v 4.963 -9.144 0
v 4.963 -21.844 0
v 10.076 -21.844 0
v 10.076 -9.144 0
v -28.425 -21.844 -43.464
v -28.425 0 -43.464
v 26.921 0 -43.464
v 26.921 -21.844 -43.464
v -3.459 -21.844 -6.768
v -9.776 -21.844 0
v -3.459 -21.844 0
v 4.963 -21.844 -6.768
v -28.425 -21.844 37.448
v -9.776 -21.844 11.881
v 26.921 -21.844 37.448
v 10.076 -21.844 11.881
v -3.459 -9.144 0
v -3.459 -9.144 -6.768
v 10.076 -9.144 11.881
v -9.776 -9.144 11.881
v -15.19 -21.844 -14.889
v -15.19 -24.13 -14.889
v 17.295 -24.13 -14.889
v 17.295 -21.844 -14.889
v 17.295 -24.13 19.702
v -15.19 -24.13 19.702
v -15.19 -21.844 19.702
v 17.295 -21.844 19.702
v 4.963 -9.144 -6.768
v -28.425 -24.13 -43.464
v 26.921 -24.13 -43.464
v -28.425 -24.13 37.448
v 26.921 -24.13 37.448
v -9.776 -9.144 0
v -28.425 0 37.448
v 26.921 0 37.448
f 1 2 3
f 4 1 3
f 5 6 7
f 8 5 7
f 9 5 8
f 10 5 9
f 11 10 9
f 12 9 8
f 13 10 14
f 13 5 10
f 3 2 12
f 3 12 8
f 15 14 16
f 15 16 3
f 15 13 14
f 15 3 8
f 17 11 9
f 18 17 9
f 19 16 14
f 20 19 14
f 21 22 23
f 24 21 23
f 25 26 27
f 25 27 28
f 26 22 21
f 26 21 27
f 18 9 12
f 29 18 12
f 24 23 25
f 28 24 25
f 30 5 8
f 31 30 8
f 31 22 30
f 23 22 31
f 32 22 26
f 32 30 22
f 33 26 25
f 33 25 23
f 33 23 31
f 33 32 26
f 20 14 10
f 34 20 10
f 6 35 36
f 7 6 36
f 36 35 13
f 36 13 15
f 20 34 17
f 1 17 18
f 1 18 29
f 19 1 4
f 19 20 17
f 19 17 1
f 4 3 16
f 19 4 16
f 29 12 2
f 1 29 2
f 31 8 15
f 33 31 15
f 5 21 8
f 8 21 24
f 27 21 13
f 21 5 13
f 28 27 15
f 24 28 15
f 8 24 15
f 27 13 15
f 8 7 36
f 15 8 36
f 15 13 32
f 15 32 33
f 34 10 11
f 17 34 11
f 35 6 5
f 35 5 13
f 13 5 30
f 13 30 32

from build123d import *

# Parameters (mm, degrees)
F0_W     = 55.3452633321
F0_H     = 80.9123702347
F1_DEPTH = 21.844
F3_DEPTH = 12.7
F4_W     = 55.3452633321
F4_H     = 80.9123702347
F5_DEPTH = 2.286
F6_W     = 32.4852615595
F6_H     = 34.5907891169
F7_DEPTH = 25.4


with BuildPart() as f1:
    # F0 (on Front) → F1 (new body)
    with BuildSketch(Plane.XZ):
        with Locations((-0.7519740611, -3.0078943819)):
            Rectangle(F0_W, F0_H)
    extrude(amount=F1_DEPTH)

    # F2 (on face) → F3 (cut)
    with BuildSketch(Plane.XZ.offset(21.844)):
        Polygon((10.07644739, 11.8811847642), (-9.7756581381, 11.8811847642), (-9.7756581381, 0), (-3.4590791911, 0), (-3.4590791911, -6.7677632906), (4.9630273134, -6.7677632906), (4.9630273134, 0), (10.07644739, 0), align=None)
    extrude(amount=-F3_DEPTH, mode=Mode.SUBTRACT)


with BuildPart() as f5:
    # F4 (on face) → F5 (new body)
    with BuildSketch(Plane.XZ.offset(21.844)):
        with Locations((-0.7519740611, -3.0078943819)):
            Rectangle(F4_W, F4_H)
    extrude(amount=F5_DEPTH)

    # F6 (on face) → F7 (cut)
    with BuildSketch(Plane.XZ.offset(24.13)):
        with Locations((1.0527633131, 2.4063154124)):
            Rectangle(F6_W, F6_H)
    extrude(amount=-F7_DEPTH, mode=Mode.SUBTRACT)


solid = Compound([f1.part, f5.part])
